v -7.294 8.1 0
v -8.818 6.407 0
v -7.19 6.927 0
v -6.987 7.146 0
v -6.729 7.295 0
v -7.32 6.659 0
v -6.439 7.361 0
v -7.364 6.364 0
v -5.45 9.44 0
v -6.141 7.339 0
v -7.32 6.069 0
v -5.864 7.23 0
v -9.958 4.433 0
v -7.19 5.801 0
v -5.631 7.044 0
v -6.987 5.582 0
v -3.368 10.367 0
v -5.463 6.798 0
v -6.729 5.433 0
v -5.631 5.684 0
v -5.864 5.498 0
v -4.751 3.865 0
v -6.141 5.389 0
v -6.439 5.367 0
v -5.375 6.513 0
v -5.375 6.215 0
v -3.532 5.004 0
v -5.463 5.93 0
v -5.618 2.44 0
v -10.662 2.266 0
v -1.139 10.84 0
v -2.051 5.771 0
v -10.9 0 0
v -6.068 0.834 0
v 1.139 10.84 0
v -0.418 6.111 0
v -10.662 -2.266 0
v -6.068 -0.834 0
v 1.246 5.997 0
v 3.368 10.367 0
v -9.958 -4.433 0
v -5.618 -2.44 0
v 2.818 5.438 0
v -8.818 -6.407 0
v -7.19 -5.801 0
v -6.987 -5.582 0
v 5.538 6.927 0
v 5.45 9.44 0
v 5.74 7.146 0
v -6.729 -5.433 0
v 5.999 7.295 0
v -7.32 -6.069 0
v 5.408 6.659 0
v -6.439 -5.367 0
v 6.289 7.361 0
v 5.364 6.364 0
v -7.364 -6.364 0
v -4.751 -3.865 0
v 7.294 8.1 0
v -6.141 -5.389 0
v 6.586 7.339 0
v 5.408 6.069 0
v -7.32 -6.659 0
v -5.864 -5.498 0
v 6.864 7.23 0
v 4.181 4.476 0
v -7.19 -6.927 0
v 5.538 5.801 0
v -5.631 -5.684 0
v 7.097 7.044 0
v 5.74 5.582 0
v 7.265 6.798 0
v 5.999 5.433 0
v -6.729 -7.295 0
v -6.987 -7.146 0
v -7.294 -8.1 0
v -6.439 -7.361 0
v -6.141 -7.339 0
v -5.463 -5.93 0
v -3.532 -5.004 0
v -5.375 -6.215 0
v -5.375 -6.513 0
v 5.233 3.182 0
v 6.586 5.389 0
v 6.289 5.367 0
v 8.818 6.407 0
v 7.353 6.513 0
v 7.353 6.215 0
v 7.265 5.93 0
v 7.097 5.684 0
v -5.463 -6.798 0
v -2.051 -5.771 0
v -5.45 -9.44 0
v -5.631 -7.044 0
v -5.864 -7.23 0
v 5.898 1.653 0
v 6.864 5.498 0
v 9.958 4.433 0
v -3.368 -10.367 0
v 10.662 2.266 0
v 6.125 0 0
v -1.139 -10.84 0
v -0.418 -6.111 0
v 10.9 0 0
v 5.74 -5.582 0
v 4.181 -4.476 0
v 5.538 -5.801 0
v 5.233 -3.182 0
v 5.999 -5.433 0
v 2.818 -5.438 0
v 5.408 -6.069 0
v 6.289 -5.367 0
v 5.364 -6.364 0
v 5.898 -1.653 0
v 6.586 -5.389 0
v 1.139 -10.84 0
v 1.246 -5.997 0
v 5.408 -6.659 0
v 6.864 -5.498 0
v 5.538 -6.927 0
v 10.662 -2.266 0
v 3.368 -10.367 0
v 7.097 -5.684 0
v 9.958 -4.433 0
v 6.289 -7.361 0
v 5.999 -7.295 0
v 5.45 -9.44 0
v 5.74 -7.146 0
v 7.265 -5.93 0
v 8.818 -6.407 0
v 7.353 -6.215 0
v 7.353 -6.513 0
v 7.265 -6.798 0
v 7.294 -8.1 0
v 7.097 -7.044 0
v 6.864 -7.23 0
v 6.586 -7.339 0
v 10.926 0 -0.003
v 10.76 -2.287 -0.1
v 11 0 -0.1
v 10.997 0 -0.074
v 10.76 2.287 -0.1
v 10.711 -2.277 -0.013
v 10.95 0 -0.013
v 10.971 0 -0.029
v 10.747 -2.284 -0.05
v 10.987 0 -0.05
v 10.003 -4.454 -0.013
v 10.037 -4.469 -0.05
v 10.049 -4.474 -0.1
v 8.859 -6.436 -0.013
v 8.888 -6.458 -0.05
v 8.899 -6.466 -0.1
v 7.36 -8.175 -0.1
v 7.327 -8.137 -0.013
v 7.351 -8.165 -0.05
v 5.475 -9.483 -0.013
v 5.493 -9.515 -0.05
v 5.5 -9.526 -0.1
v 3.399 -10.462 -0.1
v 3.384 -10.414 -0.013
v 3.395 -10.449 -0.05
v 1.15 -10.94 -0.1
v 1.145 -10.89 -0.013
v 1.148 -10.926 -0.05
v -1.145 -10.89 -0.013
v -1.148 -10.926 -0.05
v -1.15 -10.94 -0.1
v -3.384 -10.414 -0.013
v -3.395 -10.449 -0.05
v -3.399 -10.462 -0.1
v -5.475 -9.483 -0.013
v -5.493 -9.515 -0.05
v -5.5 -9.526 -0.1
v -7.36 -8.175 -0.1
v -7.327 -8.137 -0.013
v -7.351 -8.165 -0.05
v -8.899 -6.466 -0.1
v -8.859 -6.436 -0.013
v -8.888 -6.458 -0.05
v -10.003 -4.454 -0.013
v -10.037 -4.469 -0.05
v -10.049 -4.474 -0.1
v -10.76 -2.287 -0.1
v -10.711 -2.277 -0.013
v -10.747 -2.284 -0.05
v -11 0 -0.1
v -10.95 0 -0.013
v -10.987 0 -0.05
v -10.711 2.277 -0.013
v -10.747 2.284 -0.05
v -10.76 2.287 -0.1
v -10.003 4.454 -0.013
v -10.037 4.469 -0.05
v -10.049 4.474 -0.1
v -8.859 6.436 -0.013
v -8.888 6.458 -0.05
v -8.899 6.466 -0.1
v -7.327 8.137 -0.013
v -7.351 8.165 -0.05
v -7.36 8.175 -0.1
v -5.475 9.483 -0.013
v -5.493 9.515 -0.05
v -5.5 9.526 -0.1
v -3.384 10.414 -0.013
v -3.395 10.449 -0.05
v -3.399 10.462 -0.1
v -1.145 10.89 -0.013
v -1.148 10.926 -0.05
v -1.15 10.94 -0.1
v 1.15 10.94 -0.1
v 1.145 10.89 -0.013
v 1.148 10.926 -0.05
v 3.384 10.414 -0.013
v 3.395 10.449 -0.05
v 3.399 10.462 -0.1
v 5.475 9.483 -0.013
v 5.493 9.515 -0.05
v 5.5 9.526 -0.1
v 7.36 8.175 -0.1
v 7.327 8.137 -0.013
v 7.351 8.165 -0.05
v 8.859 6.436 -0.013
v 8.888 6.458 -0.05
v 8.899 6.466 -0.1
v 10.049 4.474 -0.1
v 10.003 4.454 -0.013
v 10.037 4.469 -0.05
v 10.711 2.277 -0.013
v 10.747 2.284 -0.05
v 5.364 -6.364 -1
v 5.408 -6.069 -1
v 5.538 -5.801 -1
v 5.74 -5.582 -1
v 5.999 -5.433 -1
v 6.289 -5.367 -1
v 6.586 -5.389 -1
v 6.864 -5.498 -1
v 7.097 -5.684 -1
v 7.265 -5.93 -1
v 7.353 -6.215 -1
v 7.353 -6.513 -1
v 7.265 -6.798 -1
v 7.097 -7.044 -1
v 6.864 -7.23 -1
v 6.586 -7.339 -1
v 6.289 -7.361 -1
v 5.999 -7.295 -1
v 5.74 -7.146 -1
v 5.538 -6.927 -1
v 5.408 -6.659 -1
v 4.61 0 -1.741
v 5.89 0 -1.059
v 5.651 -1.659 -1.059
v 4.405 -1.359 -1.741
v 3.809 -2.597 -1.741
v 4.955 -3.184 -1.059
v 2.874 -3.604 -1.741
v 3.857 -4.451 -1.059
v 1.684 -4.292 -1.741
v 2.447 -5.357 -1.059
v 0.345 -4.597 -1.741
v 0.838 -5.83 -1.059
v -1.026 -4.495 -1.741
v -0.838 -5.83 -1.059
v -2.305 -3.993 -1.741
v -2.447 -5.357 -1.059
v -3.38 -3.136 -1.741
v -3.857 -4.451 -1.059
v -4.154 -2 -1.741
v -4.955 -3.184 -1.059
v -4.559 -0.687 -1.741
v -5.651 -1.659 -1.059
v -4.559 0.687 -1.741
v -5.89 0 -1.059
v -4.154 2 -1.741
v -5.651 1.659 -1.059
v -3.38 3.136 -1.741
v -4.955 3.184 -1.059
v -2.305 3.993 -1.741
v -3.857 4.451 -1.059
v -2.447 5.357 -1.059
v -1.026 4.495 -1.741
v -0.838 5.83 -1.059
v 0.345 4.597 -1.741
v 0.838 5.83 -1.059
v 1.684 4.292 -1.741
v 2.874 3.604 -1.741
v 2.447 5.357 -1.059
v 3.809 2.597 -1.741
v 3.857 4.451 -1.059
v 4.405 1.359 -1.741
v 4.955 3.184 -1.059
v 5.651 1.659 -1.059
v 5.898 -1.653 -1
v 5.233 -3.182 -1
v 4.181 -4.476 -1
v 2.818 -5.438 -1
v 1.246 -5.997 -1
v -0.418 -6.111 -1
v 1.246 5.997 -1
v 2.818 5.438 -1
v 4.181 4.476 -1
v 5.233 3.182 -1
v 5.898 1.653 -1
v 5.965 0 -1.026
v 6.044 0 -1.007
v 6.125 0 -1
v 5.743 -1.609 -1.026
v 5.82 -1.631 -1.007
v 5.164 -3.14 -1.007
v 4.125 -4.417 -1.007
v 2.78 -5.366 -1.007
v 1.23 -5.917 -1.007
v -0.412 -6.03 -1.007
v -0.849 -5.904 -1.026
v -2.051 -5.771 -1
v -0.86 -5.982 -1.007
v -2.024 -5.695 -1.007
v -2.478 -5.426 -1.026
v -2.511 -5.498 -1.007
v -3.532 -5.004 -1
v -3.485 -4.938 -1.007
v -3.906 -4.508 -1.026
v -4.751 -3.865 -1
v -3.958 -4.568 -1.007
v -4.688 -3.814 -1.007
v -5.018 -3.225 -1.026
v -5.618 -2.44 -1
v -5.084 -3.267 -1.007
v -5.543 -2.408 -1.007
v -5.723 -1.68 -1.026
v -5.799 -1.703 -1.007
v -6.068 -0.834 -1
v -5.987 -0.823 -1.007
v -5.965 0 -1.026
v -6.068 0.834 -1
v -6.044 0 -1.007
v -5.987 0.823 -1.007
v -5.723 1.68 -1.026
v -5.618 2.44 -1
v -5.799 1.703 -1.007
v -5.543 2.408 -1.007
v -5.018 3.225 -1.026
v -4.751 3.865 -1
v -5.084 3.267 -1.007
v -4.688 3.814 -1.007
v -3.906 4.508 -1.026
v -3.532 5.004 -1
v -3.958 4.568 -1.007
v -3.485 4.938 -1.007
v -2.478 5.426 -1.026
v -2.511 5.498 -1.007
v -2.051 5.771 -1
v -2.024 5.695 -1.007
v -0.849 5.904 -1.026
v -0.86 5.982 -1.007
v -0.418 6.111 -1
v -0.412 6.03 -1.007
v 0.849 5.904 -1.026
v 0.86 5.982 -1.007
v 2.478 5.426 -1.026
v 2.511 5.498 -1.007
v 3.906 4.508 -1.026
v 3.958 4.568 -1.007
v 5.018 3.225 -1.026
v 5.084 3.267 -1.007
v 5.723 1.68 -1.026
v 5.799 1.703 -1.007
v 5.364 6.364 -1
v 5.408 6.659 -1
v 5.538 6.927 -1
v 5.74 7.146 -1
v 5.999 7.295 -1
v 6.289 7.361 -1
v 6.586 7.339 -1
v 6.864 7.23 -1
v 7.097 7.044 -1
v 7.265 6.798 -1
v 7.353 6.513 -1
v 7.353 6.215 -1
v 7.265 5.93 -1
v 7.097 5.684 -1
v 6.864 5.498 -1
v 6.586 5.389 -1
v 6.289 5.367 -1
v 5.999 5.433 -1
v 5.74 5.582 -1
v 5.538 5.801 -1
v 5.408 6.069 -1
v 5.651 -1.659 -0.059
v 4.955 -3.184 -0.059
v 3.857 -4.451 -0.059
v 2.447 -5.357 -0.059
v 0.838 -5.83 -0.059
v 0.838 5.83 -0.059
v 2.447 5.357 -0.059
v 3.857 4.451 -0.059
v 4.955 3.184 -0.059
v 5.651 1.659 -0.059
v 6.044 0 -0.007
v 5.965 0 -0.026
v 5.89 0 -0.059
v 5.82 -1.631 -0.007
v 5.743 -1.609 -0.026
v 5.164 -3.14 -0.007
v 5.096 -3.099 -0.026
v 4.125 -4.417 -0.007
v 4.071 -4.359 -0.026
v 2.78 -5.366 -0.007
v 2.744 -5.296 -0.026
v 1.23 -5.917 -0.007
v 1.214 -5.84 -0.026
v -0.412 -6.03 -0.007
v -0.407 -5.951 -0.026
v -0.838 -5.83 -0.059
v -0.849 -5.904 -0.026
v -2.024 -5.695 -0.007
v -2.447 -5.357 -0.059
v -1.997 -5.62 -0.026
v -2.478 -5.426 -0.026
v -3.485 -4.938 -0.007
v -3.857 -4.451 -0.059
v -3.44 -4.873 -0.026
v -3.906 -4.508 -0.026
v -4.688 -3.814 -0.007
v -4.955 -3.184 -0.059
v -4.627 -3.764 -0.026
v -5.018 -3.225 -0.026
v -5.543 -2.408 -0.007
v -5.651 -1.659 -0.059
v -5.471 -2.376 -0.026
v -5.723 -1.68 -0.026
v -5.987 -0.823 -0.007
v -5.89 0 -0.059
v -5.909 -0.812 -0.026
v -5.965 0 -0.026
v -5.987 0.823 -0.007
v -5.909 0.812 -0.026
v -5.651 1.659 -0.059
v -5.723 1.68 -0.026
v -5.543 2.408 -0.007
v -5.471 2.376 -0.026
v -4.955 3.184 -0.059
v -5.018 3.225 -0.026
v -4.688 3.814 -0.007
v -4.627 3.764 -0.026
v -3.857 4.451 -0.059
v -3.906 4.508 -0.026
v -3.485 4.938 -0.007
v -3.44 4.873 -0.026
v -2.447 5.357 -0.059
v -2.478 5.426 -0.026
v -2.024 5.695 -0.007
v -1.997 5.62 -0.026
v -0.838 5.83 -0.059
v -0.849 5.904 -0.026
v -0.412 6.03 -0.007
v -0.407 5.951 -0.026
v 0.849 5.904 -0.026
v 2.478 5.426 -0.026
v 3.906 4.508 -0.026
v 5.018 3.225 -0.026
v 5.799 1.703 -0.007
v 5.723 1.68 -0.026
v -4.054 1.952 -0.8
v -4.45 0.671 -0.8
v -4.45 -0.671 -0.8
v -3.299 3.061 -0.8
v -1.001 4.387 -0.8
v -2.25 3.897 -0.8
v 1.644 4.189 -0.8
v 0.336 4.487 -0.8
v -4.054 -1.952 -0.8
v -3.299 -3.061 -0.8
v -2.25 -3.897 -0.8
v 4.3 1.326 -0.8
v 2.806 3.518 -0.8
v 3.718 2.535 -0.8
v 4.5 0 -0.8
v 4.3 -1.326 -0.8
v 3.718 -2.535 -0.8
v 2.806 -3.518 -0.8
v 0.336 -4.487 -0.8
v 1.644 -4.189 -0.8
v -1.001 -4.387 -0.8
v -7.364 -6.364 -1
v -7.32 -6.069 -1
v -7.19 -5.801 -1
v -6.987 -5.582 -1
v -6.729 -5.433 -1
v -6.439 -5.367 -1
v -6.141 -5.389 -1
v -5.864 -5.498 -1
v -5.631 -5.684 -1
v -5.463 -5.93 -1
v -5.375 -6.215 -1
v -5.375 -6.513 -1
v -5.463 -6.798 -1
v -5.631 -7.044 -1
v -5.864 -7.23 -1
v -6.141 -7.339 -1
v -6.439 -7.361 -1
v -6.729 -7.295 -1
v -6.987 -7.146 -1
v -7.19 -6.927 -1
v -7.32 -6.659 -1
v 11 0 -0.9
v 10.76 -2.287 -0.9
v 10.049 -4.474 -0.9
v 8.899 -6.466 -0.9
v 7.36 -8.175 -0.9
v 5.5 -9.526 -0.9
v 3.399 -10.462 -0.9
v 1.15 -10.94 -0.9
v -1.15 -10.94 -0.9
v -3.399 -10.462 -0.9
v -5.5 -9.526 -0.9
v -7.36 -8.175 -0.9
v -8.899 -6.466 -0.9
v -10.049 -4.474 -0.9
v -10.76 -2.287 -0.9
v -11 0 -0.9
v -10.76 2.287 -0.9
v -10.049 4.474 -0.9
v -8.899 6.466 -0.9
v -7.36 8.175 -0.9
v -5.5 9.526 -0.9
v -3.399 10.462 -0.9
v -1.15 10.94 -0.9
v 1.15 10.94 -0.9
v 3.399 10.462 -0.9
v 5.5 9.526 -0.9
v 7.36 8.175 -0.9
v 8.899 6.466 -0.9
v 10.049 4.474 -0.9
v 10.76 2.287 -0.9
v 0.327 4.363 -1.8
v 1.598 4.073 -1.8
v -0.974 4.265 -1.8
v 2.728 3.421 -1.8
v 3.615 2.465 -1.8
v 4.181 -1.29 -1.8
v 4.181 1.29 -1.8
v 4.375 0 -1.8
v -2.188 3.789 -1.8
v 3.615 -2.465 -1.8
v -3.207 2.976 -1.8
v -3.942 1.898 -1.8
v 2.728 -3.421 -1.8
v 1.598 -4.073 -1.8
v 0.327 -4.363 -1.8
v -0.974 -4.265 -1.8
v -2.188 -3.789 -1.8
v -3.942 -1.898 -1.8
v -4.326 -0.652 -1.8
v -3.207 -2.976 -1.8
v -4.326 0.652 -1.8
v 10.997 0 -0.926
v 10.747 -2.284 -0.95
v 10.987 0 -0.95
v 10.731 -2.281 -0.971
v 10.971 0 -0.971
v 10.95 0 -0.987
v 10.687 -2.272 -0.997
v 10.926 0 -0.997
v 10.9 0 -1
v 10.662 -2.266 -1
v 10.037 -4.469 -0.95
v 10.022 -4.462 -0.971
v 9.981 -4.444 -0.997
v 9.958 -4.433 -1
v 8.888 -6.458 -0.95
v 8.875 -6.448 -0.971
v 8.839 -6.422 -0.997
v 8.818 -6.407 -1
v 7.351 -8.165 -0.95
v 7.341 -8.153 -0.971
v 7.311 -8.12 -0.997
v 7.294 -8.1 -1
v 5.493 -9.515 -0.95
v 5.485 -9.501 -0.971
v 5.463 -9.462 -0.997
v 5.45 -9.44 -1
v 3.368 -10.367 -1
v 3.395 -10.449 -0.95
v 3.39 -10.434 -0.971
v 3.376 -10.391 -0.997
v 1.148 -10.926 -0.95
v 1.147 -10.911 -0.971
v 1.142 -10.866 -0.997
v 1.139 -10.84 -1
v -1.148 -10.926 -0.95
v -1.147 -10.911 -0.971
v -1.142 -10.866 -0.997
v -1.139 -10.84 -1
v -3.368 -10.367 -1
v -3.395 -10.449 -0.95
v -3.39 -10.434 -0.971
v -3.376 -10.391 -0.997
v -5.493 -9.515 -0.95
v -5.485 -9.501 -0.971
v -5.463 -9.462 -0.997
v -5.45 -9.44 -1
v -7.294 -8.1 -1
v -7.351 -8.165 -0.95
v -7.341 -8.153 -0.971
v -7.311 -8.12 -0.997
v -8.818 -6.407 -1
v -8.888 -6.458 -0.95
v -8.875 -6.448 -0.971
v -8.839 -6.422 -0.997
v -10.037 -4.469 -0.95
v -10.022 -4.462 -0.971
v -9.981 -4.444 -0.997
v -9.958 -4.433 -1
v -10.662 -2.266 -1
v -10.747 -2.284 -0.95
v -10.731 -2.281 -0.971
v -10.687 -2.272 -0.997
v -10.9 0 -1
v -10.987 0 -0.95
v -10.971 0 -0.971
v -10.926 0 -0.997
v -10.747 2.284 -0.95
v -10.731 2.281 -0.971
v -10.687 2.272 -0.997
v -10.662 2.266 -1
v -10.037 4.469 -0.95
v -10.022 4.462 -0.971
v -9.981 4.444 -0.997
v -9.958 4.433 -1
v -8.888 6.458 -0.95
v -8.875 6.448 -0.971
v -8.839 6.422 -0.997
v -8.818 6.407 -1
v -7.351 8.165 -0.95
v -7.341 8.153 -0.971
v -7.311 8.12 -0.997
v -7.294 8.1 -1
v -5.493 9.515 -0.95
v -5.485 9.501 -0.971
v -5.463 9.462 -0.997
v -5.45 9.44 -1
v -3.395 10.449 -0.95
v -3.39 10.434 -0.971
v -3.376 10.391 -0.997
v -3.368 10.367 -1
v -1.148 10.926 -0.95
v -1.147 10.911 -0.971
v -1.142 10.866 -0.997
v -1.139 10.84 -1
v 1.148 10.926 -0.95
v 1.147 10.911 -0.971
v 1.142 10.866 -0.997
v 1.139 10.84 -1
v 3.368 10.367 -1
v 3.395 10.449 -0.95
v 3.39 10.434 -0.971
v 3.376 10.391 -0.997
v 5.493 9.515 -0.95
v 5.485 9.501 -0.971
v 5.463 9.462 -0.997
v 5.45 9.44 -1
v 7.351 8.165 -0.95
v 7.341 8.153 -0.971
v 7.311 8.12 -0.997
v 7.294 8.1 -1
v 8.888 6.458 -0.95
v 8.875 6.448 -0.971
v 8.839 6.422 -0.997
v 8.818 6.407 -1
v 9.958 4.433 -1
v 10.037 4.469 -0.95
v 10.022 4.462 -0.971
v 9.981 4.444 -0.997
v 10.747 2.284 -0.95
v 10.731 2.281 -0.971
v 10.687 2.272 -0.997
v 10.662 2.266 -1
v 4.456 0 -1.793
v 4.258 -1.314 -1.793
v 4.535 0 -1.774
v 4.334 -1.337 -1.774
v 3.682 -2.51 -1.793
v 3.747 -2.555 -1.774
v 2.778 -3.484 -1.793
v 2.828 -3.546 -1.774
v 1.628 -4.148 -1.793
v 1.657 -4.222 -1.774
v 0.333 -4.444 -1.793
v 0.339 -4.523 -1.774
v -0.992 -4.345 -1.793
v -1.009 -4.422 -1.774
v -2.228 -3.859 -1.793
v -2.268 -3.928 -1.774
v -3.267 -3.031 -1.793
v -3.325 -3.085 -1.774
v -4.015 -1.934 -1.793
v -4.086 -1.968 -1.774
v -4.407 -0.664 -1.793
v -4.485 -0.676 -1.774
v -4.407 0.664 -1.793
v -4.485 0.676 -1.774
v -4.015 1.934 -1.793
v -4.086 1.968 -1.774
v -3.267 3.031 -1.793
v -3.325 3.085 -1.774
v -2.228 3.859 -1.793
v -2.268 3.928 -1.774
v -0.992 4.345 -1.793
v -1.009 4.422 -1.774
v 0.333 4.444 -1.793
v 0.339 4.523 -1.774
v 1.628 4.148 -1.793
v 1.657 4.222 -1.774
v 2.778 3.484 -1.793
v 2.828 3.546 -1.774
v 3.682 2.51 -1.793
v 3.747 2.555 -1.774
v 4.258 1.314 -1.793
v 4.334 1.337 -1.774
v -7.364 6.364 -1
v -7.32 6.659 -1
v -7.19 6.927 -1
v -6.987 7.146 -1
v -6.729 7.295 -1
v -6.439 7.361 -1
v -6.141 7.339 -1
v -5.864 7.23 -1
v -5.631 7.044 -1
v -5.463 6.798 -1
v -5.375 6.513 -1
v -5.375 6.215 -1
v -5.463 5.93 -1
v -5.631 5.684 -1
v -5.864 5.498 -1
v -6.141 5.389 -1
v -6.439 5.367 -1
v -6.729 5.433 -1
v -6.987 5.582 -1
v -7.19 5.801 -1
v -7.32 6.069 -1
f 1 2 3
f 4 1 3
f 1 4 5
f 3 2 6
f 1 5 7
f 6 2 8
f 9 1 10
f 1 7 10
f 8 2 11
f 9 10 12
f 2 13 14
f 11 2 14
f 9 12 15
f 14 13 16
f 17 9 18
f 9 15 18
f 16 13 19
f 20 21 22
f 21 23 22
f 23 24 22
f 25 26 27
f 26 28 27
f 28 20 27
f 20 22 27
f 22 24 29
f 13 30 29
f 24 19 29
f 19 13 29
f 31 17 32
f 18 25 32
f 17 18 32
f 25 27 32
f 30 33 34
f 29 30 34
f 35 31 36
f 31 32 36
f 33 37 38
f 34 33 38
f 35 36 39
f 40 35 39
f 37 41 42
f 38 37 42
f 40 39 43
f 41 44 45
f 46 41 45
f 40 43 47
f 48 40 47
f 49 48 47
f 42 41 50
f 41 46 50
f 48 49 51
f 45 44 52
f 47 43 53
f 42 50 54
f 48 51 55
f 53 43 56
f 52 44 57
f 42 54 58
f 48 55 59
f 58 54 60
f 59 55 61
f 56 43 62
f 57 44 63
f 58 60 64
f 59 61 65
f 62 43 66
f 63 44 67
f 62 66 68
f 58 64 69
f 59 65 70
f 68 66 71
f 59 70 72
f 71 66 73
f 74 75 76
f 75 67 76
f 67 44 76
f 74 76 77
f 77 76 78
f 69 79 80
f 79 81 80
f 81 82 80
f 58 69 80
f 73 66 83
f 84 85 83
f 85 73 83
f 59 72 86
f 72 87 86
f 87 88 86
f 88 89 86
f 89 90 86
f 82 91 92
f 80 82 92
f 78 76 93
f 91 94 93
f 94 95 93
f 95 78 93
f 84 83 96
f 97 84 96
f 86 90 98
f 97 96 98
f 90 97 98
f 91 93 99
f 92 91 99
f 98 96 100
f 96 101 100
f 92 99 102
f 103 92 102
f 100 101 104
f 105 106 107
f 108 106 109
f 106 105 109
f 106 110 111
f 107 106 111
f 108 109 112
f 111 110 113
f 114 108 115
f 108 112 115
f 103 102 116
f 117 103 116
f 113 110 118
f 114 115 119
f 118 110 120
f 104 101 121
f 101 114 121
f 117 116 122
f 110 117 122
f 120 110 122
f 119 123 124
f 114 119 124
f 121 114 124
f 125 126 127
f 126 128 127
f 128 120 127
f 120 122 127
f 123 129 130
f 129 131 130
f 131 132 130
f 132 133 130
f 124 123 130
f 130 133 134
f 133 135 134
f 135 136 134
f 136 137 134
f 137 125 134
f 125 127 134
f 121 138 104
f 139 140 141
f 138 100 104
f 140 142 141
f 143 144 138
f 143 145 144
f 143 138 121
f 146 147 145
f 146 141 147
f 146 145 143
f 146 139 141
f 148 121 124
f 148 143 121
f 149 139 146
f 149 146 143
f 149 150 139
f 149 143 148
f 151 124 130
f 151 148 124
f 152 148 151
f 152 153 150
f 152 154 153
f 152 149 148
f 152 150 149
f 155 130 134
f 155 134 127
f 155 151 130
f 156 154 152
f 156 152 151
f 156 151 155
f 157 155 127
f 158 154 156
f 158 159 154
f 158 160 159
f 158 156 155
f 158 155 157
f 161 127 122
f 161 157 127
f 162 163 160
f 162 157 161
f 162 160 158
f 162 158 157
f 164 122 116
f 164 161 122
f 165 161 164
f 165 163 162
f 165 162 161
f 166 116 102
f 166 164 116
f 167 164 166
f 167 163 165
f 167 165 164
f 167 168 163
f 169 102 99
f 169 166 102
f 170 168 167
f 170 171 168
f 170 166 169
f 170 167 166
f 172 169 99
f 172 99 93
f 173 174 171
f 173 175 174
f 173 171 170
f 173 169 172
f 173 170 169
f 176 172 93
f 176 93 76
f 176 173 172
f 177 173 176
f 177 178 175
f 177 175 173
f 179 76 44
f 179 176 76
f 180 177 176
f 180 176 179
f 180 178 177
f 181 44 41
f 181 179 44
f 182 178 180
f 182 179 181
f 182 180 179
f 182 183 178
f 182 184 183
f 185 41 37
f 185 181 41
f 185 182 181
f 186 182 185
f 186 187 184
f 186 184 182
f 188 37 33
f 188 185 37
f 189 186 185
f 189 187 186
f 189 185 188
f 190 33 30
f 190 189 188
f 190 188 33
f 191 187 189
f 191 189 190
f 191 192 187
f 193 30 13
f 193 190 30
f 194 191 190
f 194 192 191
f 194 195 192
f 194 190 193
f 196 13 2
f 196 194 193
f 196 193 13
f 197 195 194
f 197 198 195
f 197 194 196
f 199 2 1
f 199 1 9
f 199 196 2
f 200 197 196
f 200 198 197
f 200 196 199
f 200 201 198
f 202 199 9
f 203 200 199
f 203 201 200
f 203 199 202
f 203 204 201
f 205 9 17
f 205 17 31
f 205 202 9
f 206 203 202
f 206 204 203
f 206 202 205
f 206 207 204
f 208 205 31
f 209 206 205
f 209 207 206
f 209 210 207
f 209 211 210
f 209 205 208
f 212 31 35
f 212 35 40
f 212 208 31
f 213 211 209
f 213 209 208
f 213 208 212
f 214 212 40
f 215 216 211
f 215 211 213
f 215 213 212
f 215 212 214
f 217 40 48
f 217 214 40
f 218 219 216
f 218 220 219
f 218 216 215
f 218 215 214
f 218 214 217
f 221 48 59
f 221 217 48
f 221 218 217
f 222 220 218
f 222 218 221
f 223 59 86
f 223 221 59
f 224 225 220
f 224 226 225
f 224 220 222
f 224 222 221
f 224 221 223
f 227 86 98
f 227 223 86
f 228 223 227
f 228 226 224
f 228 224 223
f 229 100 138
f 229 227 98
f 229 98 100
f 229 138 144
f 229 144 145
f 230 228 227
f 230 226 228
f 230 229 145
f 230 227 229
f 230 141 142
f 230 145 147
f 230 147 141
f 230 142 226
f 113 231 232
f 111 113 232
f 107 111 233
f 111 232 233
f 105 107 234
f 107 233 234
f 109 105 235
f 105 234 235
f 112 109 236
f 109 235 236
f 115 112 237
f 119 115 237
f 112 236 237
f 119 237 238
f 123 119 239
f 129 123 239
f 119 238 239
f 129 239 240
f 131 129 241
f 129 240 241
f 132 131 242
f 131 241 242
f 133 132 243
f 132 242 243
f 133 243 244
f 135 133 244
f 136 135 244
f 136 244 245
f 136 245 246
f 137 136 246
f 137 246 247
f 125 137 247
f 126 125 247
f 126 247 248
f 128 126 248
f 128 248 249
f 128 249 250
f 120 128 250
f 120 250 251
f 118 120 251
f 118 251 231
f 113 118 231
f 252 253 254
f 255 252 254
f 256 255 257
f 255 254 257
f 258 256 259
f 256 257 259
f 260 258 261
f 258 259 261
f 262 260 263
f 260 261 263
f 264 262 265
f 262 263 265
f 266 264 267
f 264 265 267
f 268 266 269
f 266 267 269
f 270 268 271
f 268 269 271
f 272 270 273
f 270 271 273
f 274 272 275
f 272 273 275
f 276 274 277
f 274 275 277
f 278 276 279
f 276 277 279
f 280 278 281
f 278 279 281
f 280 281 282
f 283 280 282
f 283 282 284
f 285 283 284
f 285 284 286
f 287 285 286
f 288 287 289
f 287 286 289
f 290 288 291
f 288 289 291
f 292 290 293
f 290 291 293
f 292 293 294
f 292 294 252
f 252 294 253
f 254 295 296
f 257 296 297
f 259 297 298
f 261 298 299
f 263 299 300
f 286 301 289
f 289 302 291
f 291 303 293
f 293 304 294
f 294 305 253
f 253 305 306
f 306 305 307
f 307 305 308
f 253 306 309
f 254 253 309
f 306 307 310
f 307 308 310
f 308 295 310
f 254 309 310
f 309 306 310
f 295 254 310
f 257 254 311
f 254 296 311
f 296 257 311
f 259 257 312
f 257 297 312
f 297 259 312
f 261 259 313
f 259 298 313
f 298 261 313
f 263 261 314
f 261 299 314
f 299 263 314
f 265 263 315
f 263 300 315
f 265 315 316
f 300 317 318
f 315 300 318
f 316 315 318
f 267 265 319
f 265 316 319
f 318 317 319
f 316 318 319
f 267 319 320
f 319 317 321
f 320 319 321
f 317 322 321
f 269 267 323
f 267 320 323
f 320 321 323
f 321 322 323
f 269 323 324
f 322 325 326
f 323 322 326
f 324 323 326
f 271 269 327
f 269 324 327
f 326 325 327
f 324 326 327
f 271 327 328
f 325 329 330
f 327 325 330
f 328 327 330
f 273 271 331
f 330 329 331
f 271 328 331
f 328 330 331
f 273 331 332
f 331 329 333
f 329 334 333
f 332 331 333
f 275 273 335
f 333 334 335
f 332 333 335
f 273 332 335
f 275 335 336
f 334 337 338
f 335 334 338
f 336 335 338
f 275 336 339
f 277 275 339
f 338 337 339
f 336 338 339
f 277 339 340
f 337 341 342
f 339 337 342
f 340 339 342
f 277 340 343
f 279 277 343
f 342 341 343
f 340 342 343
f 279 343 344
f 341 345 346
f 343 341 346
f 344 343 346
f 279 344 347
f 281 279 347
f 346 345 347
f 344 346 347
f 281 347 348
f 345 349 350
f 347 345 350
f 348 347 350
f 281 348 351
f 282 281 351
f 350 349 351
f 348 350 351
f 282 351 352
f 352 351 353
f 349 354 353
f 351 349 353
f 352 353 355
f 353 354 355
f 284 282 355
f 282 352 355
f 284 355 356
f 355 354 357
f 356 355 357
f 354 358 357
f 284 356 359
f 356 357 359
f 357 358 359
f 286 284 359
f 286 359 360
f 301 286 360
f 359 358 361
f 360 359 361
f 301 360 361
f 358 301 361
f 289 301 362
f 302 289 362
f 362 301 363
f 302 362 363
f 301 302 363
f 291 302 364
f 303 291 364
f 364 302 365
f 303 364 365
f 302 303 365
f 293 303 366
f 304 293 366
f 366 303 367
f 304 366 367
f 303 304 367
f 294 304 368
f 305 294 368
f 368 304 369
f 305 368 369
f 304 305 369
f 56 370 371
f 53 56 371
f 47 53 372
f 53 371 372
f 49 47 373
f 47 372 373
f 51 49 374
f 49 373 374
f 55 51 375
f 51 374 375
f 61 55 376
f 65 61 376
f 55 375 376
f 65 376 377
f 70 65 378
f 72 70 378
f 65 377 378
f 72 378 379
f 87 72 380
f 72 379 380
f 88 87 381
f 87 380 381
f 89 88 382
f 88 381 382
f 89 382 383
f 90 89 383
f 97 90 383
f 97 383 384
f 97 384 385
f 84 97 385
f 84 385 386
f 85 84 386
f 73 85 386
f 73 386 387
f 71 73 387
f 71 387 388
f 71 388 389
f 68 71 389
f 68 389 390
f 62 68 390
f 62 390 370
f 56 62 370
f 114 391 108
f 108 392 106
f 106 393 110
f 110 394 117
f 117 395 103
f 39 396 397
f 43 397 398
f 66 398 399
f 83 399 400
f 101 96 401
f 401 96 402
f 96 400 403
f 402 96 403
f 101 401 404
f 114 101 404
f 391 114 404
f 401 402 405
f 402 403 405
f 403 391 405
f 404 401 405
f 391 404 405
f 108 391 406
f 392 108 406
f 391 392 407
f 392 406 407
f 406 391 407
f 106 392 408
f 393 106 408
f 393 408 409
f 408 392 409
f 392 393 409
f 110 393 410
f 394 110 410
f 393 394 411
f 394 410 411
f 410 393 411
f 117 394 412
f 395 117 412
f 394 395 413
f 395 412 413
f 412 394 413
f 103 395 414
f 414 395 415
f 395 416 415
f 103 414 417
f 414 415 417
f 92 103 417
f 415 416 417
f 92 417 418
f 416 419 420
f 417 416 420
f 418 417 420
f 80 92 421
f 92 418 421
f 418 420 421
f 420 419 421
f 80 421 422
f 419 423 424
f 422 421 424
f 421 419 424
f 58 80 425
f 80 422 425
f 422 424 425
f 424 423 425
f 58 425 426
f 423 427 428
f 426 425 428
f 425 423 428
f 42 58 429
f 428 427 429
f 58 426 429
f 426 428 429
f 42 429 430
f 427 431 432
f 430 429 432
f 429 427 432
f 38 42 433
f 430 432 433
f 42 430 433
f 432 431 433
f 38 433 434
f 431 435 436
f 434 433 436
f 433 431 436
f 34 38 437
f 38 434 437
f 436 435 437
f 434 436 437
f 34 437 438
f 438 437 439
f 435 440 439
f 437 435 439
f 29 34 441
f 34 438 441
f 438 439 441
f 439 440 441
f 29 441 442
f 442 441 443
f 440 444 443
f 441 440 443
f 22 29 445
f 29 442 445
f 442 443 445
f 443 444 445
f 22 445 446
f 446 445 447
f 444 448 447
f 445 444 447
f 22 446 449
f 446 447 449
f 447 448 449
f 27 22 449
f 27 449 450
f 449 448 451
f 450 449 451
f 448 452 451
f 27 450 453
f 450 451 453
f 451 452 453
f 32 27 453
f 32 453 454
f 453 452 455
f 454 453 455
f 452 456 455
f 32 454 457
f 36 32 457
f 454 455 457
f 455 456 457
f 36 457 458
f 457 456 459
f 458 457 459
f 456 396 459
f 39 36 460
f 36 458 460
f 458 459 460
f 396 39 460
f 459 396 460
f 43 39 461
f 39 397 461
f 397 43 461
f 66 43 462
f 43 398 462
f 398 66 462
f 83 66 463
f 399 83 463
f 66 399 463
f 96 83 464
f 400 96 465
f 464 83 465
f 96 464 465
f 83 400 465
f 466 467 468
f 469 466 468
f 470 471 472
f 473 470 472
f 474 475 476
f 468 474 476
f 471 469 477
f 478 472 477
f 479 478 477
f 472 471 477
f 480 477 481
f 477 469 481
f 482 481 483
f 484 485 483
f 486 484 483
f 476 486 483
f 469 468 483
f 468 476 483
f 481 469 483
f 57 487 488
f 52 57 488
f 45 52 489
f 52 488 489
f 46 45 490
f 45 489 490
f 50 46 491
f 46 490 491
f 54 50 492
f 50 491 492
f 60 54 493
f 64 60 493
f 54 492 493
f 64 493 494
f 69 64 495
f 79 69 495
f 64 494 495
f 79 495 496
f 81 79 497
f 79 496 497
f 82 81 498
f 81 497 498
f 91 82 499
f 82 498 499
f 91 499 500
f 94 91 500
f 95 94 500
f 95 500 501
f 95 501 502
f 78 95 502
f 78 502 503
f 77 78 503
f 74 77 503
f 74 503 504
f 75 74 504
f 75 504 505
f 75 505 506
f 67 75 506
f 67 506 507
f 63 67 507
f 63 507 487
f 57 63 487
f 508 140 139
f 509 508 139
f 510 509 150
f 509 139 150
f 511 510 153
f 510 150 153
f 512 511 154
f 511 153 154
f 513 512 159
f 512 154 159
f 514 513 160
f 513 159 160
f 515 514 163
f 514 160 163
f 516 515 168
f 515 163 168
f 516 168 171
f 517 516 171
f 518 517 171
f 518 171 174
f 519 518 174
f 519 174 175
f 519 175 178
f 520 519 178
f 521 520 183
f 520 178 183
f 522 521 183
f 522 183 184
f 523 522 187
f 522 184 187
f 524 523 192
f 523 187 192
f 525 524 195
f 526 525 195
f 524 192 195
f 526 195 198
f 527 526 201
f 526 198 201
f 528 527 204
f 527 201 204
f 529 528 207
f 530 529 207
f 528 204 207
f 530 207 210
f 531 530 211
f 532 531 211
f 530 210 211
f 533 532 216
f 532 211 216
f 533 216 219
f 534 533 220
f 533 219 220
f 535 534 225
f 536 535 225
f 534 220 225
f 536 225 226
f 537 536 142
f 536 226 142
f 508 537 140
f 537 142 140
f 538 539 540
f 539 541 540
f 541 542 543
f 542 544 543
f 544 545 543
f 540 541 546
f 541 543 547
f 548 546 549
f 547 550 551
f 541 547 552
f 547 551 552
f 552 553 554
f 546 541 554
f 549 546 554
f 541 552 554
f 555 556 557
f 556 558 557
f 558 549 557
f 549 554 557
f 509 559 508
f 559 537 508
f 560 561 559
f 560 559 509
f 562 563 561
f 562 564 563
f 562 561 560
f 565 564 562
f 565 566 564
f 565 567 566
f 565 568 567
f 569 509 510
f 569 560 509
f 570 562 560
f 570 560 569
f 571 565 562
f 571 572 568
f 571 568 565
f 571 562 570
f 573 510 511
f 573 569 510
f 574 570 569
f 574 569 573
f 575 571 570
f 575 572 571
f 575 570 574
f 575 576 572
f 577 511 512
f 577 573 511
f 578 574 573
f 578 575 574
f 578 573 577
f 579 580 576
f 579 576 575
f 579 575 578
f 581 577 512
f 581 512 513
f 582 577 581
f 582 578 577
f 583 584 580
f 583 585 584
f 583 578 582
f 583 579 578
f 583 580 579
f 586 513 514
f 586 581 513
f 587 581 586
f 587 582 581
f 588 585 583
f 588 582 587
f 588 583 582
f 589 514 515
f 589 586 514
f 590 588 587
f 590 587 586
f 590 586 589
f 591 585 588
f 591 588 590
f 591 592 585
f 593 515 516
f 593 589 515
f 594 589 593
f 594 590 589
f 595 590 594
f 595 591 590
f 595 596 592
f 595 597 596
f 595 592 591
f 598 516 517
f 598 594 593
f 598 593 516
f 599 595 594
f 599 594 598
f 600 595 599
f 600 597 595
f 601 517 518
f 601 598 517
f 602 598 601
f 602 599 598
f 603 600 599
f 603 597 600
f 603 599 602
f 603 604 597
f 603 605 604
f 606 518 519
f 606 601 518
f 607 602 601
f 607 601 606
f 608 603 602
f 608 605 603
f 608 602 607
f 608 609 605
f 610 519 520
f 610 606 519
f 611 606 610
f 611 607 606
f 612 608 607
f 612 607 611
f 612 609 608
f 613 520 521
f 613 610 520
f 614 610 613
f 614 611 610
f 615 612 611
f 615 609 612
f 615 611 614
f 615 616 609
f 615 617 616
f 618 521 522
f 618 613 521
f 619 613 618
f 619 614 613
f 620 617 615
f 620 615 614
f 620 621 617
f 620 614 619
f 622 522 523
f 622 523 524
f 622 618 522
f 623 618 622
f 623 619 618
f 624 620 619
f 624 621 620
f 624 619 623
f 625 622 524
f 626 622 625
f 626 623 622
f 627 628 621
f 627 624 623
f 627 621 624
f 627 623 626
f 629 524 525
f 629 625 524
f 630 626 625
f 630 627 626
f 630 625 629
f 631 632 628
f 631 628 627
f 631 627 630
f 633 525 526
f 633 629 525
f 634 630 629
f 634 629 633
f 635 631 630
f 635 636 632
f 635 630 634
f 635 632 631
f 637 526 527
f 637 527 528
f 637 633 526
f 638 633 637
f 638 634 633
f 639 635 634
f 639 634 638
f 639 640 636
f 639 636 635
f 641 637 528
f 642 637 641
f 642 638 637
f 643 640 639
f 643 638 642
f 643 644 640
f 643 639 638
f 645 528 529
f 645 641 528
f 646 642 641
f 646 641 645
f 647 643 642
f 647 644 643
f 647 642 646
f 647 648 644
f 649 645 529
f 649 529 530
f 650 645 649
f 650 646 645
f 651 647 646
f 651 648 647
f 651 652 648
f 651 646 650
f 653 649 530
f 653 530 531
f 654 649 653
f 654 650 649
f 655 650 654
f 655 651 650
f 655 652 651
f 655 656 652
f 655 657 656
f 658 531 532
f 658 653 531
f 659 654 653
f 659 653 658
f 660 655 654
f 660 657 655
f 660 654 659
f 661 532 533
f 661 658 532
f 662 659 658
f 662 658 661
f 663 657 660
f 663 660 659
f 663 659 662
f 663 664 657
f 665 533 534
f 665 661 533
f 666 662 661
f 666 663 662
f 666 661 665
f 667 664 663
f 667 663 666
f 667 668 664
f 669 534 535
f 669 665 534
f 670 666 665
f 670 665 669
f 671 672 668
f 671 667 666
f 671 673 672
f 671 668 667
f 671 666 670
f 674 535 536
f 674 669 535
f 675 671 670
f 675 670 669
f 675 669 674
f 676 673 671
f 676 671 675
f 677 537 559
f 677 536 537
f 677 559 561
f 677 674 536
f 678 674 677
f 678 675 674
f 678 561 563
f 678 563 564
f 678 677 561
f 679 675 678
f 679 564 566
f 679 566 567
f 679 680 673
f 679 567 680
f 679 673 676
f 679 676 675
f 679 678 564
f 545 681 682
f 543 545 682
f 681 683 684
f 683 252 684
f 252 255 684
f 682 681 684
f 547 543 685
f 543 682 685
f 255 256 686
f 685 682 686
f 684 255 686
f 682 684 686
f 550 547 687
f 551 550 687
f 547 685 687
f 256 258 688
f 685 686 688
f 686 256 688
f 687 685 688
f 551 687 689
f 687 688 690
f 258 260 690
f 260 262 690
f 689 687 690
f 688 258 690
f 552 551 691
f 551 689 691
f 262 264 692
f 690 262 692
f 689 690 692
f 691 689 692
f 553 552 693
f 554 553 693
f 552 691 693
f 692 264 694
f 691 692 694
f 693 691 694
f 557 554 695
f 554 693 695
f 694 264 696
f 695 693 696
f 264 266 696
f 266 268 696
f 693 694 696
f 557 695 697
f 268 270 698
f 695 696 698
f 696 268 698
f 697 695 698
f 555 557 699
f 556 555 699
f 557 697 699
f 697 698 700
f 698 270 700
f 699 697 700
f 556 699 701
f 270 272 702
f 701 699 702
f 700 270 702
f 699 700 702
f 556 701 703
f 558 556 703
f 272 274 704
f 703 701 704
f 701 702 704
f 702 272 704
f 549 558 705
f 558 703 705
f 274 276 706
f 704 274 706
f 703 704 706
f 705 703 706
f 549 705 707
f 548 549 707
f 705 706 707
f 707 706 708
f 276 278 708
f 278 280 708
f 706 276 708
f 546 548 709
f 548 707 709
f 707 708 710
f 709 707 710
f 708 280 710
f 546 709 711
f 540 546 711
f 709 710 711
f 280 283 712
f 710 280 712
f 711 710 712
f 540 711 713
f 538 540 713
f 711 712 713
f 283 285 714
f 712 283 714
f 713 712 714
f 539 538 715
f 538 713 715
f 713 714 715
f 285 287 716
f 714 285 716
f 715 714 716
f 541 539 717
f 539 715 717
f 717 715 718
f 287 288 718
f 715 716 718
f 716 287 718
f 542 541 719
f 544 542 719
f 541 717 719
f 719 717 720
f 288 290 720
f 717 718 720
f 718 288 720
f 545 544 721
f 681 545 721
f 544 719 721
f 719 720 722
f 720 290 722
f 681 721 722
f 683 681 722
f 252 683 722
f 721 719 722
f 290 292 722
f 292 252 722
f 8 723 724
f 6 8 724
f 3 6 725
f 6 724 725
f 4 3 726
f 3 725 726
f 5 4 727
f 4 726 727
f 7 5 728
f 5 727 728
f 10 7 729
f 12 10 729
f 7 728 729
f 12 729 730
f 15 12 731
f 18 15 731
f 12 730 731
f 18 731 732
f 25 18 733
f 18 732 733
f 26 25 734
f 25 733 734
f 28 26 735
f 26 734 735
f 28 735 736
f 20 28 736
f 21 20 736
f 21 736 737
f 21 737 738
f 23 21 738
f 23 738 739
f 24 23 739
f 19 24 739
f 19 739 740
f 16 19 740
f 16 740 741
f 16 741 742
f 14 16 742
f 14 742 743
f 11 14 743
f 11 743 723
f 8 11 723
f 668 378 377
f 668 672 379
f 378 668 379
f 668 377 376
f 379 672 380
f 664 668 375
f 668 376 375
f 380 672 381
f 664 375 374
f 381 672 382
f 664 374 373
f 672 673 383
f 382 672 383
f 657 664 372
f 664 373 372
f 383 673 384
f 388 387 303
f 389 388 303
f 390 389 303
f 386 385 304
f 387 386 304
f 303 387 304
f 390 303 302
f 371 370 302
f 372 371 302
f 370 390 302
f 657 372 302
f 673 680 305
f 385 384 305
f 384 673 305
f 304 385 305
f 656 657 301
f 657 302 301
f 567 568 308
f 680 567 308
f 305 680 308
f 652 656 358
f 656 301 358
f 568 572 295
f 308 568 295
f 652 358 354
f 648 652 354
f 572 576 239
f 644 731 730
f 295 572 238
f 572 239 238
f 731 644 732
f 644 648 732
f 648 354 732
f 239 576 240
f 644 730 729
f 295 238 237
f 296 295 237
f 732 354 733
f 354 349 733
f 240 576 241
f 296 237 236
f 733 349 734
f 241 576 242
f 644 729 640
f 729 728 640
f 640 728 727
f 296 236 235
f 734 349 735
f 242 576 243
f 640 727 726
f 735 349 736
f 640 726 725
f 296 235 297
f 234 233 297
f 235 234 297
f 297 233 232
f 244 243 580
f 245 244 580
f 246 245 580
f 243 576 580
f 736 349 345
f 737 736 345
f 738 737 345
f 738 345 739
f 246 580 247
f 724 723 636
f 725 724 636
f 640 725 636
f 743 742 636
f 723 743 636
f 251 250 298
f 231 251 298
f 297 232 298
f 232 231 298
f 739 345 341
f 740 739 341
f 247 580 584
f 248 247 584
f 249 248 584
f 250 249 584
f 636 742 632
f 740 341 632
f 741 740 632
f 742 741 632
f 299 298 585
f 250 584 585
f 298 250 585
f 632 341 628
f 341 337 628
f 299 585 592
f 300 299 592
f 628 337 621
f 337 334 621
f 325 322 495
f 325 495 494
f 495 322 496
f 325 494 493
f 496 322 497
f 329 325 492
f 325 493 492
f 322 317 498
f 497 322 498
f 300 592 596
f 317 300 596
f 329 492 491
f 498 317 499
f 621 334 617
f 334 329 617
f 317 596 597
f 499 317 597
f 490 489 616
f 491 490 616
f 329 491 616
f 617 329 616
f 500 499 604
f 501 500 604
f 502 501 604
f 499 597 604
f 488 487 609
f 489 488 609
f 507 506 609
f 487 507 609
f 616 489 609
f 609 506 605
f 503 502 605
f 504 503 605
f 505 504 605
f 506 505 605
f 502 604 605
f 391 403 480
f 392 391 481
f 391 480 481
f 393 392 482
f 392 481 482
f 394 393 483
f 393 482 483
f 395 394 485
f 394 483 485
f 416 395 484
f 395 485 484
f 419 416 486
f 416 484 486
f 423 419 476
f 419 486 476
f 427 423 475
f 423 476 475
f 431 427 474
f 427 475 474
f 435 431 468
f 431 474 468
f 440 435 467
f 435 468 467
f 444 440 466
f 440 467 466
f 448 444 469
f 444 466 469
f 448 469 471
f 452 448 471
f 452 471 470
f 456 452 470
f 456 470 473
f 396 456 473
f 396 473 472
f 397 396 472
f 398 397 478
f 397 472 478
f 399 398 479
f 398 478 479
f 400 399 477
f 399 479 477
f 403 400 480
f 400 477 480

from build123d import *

# Parameters (mm, degrees)
FILLET1_R          = 0.5
SKETCH2_R          = 1
CUT_EXTRUDE1_DEPTH = 16.588457268
FILLET2_R          = 0.1


with BuildPart() as part:
    # Sketch1 → Revolve1 (revolve)
    with BuildSketch(Plane(origin=(0, 0, 0), x_dir=(0, 0, -1), z_dir=(1, 0, 0)), mode=Mode.PRIVATE) as revolve1_sk:
        Polygon((0, 11), (0, 6), (0.8, 4.5), (0.8, 0), (1.8, 0), (1.8, 4.5), (1, 6), (1, 11), align=None)
    revolve(revolve1_sk.sketch.rotate(Axis((0, 0, 0), (0, 0, -1)), 90), axis=Axis((0, 0, 0), (0, 0, -1)))

    # Fillet1
    fillet1_edges = [part.edges().sort_by_distance(p)[0] for p in [
        (-6, 0, 0),
        (-4.5, 0, -1.8),
        (-6, 0, -1),
    ]]
    fillet(fillet1_edges, radius=FILLET1_R)

    # Sketch2 → Cut-Extrude1 (cut, through all)
    with BuildSketch(Plane(origin=(0, 0, -1), x_dir=(-1, 0, 0), z_dir=(0, 0, -1))):
        with Locations((6.363961031, 6.363961031)):
            Circle(SKETCH2_R)
        with Locations((6.363961031, -6.363961031)):
            Circle(SKETCH2_R)
        with Locations((-6.363961031, -6.363961031)):
            Circle(SKETCH2_R)
        with Locations((-6.363961031, 6.363961031)):
            Circle(SKETCH2_R)
    extrude(amount=-CUT_EXTRUDE1_DEPTH, mode=Mode.SUBTRACT)

    # Fillet2
    fillet2_edges = [part.edges().sort_by_distance(p)[0] for p in [
        (-11, 0, -1),
        (-11, 0, 0),
    ]]
    fillet(fillet2_edges, radius=FILLET2_R)


solid = part.part
